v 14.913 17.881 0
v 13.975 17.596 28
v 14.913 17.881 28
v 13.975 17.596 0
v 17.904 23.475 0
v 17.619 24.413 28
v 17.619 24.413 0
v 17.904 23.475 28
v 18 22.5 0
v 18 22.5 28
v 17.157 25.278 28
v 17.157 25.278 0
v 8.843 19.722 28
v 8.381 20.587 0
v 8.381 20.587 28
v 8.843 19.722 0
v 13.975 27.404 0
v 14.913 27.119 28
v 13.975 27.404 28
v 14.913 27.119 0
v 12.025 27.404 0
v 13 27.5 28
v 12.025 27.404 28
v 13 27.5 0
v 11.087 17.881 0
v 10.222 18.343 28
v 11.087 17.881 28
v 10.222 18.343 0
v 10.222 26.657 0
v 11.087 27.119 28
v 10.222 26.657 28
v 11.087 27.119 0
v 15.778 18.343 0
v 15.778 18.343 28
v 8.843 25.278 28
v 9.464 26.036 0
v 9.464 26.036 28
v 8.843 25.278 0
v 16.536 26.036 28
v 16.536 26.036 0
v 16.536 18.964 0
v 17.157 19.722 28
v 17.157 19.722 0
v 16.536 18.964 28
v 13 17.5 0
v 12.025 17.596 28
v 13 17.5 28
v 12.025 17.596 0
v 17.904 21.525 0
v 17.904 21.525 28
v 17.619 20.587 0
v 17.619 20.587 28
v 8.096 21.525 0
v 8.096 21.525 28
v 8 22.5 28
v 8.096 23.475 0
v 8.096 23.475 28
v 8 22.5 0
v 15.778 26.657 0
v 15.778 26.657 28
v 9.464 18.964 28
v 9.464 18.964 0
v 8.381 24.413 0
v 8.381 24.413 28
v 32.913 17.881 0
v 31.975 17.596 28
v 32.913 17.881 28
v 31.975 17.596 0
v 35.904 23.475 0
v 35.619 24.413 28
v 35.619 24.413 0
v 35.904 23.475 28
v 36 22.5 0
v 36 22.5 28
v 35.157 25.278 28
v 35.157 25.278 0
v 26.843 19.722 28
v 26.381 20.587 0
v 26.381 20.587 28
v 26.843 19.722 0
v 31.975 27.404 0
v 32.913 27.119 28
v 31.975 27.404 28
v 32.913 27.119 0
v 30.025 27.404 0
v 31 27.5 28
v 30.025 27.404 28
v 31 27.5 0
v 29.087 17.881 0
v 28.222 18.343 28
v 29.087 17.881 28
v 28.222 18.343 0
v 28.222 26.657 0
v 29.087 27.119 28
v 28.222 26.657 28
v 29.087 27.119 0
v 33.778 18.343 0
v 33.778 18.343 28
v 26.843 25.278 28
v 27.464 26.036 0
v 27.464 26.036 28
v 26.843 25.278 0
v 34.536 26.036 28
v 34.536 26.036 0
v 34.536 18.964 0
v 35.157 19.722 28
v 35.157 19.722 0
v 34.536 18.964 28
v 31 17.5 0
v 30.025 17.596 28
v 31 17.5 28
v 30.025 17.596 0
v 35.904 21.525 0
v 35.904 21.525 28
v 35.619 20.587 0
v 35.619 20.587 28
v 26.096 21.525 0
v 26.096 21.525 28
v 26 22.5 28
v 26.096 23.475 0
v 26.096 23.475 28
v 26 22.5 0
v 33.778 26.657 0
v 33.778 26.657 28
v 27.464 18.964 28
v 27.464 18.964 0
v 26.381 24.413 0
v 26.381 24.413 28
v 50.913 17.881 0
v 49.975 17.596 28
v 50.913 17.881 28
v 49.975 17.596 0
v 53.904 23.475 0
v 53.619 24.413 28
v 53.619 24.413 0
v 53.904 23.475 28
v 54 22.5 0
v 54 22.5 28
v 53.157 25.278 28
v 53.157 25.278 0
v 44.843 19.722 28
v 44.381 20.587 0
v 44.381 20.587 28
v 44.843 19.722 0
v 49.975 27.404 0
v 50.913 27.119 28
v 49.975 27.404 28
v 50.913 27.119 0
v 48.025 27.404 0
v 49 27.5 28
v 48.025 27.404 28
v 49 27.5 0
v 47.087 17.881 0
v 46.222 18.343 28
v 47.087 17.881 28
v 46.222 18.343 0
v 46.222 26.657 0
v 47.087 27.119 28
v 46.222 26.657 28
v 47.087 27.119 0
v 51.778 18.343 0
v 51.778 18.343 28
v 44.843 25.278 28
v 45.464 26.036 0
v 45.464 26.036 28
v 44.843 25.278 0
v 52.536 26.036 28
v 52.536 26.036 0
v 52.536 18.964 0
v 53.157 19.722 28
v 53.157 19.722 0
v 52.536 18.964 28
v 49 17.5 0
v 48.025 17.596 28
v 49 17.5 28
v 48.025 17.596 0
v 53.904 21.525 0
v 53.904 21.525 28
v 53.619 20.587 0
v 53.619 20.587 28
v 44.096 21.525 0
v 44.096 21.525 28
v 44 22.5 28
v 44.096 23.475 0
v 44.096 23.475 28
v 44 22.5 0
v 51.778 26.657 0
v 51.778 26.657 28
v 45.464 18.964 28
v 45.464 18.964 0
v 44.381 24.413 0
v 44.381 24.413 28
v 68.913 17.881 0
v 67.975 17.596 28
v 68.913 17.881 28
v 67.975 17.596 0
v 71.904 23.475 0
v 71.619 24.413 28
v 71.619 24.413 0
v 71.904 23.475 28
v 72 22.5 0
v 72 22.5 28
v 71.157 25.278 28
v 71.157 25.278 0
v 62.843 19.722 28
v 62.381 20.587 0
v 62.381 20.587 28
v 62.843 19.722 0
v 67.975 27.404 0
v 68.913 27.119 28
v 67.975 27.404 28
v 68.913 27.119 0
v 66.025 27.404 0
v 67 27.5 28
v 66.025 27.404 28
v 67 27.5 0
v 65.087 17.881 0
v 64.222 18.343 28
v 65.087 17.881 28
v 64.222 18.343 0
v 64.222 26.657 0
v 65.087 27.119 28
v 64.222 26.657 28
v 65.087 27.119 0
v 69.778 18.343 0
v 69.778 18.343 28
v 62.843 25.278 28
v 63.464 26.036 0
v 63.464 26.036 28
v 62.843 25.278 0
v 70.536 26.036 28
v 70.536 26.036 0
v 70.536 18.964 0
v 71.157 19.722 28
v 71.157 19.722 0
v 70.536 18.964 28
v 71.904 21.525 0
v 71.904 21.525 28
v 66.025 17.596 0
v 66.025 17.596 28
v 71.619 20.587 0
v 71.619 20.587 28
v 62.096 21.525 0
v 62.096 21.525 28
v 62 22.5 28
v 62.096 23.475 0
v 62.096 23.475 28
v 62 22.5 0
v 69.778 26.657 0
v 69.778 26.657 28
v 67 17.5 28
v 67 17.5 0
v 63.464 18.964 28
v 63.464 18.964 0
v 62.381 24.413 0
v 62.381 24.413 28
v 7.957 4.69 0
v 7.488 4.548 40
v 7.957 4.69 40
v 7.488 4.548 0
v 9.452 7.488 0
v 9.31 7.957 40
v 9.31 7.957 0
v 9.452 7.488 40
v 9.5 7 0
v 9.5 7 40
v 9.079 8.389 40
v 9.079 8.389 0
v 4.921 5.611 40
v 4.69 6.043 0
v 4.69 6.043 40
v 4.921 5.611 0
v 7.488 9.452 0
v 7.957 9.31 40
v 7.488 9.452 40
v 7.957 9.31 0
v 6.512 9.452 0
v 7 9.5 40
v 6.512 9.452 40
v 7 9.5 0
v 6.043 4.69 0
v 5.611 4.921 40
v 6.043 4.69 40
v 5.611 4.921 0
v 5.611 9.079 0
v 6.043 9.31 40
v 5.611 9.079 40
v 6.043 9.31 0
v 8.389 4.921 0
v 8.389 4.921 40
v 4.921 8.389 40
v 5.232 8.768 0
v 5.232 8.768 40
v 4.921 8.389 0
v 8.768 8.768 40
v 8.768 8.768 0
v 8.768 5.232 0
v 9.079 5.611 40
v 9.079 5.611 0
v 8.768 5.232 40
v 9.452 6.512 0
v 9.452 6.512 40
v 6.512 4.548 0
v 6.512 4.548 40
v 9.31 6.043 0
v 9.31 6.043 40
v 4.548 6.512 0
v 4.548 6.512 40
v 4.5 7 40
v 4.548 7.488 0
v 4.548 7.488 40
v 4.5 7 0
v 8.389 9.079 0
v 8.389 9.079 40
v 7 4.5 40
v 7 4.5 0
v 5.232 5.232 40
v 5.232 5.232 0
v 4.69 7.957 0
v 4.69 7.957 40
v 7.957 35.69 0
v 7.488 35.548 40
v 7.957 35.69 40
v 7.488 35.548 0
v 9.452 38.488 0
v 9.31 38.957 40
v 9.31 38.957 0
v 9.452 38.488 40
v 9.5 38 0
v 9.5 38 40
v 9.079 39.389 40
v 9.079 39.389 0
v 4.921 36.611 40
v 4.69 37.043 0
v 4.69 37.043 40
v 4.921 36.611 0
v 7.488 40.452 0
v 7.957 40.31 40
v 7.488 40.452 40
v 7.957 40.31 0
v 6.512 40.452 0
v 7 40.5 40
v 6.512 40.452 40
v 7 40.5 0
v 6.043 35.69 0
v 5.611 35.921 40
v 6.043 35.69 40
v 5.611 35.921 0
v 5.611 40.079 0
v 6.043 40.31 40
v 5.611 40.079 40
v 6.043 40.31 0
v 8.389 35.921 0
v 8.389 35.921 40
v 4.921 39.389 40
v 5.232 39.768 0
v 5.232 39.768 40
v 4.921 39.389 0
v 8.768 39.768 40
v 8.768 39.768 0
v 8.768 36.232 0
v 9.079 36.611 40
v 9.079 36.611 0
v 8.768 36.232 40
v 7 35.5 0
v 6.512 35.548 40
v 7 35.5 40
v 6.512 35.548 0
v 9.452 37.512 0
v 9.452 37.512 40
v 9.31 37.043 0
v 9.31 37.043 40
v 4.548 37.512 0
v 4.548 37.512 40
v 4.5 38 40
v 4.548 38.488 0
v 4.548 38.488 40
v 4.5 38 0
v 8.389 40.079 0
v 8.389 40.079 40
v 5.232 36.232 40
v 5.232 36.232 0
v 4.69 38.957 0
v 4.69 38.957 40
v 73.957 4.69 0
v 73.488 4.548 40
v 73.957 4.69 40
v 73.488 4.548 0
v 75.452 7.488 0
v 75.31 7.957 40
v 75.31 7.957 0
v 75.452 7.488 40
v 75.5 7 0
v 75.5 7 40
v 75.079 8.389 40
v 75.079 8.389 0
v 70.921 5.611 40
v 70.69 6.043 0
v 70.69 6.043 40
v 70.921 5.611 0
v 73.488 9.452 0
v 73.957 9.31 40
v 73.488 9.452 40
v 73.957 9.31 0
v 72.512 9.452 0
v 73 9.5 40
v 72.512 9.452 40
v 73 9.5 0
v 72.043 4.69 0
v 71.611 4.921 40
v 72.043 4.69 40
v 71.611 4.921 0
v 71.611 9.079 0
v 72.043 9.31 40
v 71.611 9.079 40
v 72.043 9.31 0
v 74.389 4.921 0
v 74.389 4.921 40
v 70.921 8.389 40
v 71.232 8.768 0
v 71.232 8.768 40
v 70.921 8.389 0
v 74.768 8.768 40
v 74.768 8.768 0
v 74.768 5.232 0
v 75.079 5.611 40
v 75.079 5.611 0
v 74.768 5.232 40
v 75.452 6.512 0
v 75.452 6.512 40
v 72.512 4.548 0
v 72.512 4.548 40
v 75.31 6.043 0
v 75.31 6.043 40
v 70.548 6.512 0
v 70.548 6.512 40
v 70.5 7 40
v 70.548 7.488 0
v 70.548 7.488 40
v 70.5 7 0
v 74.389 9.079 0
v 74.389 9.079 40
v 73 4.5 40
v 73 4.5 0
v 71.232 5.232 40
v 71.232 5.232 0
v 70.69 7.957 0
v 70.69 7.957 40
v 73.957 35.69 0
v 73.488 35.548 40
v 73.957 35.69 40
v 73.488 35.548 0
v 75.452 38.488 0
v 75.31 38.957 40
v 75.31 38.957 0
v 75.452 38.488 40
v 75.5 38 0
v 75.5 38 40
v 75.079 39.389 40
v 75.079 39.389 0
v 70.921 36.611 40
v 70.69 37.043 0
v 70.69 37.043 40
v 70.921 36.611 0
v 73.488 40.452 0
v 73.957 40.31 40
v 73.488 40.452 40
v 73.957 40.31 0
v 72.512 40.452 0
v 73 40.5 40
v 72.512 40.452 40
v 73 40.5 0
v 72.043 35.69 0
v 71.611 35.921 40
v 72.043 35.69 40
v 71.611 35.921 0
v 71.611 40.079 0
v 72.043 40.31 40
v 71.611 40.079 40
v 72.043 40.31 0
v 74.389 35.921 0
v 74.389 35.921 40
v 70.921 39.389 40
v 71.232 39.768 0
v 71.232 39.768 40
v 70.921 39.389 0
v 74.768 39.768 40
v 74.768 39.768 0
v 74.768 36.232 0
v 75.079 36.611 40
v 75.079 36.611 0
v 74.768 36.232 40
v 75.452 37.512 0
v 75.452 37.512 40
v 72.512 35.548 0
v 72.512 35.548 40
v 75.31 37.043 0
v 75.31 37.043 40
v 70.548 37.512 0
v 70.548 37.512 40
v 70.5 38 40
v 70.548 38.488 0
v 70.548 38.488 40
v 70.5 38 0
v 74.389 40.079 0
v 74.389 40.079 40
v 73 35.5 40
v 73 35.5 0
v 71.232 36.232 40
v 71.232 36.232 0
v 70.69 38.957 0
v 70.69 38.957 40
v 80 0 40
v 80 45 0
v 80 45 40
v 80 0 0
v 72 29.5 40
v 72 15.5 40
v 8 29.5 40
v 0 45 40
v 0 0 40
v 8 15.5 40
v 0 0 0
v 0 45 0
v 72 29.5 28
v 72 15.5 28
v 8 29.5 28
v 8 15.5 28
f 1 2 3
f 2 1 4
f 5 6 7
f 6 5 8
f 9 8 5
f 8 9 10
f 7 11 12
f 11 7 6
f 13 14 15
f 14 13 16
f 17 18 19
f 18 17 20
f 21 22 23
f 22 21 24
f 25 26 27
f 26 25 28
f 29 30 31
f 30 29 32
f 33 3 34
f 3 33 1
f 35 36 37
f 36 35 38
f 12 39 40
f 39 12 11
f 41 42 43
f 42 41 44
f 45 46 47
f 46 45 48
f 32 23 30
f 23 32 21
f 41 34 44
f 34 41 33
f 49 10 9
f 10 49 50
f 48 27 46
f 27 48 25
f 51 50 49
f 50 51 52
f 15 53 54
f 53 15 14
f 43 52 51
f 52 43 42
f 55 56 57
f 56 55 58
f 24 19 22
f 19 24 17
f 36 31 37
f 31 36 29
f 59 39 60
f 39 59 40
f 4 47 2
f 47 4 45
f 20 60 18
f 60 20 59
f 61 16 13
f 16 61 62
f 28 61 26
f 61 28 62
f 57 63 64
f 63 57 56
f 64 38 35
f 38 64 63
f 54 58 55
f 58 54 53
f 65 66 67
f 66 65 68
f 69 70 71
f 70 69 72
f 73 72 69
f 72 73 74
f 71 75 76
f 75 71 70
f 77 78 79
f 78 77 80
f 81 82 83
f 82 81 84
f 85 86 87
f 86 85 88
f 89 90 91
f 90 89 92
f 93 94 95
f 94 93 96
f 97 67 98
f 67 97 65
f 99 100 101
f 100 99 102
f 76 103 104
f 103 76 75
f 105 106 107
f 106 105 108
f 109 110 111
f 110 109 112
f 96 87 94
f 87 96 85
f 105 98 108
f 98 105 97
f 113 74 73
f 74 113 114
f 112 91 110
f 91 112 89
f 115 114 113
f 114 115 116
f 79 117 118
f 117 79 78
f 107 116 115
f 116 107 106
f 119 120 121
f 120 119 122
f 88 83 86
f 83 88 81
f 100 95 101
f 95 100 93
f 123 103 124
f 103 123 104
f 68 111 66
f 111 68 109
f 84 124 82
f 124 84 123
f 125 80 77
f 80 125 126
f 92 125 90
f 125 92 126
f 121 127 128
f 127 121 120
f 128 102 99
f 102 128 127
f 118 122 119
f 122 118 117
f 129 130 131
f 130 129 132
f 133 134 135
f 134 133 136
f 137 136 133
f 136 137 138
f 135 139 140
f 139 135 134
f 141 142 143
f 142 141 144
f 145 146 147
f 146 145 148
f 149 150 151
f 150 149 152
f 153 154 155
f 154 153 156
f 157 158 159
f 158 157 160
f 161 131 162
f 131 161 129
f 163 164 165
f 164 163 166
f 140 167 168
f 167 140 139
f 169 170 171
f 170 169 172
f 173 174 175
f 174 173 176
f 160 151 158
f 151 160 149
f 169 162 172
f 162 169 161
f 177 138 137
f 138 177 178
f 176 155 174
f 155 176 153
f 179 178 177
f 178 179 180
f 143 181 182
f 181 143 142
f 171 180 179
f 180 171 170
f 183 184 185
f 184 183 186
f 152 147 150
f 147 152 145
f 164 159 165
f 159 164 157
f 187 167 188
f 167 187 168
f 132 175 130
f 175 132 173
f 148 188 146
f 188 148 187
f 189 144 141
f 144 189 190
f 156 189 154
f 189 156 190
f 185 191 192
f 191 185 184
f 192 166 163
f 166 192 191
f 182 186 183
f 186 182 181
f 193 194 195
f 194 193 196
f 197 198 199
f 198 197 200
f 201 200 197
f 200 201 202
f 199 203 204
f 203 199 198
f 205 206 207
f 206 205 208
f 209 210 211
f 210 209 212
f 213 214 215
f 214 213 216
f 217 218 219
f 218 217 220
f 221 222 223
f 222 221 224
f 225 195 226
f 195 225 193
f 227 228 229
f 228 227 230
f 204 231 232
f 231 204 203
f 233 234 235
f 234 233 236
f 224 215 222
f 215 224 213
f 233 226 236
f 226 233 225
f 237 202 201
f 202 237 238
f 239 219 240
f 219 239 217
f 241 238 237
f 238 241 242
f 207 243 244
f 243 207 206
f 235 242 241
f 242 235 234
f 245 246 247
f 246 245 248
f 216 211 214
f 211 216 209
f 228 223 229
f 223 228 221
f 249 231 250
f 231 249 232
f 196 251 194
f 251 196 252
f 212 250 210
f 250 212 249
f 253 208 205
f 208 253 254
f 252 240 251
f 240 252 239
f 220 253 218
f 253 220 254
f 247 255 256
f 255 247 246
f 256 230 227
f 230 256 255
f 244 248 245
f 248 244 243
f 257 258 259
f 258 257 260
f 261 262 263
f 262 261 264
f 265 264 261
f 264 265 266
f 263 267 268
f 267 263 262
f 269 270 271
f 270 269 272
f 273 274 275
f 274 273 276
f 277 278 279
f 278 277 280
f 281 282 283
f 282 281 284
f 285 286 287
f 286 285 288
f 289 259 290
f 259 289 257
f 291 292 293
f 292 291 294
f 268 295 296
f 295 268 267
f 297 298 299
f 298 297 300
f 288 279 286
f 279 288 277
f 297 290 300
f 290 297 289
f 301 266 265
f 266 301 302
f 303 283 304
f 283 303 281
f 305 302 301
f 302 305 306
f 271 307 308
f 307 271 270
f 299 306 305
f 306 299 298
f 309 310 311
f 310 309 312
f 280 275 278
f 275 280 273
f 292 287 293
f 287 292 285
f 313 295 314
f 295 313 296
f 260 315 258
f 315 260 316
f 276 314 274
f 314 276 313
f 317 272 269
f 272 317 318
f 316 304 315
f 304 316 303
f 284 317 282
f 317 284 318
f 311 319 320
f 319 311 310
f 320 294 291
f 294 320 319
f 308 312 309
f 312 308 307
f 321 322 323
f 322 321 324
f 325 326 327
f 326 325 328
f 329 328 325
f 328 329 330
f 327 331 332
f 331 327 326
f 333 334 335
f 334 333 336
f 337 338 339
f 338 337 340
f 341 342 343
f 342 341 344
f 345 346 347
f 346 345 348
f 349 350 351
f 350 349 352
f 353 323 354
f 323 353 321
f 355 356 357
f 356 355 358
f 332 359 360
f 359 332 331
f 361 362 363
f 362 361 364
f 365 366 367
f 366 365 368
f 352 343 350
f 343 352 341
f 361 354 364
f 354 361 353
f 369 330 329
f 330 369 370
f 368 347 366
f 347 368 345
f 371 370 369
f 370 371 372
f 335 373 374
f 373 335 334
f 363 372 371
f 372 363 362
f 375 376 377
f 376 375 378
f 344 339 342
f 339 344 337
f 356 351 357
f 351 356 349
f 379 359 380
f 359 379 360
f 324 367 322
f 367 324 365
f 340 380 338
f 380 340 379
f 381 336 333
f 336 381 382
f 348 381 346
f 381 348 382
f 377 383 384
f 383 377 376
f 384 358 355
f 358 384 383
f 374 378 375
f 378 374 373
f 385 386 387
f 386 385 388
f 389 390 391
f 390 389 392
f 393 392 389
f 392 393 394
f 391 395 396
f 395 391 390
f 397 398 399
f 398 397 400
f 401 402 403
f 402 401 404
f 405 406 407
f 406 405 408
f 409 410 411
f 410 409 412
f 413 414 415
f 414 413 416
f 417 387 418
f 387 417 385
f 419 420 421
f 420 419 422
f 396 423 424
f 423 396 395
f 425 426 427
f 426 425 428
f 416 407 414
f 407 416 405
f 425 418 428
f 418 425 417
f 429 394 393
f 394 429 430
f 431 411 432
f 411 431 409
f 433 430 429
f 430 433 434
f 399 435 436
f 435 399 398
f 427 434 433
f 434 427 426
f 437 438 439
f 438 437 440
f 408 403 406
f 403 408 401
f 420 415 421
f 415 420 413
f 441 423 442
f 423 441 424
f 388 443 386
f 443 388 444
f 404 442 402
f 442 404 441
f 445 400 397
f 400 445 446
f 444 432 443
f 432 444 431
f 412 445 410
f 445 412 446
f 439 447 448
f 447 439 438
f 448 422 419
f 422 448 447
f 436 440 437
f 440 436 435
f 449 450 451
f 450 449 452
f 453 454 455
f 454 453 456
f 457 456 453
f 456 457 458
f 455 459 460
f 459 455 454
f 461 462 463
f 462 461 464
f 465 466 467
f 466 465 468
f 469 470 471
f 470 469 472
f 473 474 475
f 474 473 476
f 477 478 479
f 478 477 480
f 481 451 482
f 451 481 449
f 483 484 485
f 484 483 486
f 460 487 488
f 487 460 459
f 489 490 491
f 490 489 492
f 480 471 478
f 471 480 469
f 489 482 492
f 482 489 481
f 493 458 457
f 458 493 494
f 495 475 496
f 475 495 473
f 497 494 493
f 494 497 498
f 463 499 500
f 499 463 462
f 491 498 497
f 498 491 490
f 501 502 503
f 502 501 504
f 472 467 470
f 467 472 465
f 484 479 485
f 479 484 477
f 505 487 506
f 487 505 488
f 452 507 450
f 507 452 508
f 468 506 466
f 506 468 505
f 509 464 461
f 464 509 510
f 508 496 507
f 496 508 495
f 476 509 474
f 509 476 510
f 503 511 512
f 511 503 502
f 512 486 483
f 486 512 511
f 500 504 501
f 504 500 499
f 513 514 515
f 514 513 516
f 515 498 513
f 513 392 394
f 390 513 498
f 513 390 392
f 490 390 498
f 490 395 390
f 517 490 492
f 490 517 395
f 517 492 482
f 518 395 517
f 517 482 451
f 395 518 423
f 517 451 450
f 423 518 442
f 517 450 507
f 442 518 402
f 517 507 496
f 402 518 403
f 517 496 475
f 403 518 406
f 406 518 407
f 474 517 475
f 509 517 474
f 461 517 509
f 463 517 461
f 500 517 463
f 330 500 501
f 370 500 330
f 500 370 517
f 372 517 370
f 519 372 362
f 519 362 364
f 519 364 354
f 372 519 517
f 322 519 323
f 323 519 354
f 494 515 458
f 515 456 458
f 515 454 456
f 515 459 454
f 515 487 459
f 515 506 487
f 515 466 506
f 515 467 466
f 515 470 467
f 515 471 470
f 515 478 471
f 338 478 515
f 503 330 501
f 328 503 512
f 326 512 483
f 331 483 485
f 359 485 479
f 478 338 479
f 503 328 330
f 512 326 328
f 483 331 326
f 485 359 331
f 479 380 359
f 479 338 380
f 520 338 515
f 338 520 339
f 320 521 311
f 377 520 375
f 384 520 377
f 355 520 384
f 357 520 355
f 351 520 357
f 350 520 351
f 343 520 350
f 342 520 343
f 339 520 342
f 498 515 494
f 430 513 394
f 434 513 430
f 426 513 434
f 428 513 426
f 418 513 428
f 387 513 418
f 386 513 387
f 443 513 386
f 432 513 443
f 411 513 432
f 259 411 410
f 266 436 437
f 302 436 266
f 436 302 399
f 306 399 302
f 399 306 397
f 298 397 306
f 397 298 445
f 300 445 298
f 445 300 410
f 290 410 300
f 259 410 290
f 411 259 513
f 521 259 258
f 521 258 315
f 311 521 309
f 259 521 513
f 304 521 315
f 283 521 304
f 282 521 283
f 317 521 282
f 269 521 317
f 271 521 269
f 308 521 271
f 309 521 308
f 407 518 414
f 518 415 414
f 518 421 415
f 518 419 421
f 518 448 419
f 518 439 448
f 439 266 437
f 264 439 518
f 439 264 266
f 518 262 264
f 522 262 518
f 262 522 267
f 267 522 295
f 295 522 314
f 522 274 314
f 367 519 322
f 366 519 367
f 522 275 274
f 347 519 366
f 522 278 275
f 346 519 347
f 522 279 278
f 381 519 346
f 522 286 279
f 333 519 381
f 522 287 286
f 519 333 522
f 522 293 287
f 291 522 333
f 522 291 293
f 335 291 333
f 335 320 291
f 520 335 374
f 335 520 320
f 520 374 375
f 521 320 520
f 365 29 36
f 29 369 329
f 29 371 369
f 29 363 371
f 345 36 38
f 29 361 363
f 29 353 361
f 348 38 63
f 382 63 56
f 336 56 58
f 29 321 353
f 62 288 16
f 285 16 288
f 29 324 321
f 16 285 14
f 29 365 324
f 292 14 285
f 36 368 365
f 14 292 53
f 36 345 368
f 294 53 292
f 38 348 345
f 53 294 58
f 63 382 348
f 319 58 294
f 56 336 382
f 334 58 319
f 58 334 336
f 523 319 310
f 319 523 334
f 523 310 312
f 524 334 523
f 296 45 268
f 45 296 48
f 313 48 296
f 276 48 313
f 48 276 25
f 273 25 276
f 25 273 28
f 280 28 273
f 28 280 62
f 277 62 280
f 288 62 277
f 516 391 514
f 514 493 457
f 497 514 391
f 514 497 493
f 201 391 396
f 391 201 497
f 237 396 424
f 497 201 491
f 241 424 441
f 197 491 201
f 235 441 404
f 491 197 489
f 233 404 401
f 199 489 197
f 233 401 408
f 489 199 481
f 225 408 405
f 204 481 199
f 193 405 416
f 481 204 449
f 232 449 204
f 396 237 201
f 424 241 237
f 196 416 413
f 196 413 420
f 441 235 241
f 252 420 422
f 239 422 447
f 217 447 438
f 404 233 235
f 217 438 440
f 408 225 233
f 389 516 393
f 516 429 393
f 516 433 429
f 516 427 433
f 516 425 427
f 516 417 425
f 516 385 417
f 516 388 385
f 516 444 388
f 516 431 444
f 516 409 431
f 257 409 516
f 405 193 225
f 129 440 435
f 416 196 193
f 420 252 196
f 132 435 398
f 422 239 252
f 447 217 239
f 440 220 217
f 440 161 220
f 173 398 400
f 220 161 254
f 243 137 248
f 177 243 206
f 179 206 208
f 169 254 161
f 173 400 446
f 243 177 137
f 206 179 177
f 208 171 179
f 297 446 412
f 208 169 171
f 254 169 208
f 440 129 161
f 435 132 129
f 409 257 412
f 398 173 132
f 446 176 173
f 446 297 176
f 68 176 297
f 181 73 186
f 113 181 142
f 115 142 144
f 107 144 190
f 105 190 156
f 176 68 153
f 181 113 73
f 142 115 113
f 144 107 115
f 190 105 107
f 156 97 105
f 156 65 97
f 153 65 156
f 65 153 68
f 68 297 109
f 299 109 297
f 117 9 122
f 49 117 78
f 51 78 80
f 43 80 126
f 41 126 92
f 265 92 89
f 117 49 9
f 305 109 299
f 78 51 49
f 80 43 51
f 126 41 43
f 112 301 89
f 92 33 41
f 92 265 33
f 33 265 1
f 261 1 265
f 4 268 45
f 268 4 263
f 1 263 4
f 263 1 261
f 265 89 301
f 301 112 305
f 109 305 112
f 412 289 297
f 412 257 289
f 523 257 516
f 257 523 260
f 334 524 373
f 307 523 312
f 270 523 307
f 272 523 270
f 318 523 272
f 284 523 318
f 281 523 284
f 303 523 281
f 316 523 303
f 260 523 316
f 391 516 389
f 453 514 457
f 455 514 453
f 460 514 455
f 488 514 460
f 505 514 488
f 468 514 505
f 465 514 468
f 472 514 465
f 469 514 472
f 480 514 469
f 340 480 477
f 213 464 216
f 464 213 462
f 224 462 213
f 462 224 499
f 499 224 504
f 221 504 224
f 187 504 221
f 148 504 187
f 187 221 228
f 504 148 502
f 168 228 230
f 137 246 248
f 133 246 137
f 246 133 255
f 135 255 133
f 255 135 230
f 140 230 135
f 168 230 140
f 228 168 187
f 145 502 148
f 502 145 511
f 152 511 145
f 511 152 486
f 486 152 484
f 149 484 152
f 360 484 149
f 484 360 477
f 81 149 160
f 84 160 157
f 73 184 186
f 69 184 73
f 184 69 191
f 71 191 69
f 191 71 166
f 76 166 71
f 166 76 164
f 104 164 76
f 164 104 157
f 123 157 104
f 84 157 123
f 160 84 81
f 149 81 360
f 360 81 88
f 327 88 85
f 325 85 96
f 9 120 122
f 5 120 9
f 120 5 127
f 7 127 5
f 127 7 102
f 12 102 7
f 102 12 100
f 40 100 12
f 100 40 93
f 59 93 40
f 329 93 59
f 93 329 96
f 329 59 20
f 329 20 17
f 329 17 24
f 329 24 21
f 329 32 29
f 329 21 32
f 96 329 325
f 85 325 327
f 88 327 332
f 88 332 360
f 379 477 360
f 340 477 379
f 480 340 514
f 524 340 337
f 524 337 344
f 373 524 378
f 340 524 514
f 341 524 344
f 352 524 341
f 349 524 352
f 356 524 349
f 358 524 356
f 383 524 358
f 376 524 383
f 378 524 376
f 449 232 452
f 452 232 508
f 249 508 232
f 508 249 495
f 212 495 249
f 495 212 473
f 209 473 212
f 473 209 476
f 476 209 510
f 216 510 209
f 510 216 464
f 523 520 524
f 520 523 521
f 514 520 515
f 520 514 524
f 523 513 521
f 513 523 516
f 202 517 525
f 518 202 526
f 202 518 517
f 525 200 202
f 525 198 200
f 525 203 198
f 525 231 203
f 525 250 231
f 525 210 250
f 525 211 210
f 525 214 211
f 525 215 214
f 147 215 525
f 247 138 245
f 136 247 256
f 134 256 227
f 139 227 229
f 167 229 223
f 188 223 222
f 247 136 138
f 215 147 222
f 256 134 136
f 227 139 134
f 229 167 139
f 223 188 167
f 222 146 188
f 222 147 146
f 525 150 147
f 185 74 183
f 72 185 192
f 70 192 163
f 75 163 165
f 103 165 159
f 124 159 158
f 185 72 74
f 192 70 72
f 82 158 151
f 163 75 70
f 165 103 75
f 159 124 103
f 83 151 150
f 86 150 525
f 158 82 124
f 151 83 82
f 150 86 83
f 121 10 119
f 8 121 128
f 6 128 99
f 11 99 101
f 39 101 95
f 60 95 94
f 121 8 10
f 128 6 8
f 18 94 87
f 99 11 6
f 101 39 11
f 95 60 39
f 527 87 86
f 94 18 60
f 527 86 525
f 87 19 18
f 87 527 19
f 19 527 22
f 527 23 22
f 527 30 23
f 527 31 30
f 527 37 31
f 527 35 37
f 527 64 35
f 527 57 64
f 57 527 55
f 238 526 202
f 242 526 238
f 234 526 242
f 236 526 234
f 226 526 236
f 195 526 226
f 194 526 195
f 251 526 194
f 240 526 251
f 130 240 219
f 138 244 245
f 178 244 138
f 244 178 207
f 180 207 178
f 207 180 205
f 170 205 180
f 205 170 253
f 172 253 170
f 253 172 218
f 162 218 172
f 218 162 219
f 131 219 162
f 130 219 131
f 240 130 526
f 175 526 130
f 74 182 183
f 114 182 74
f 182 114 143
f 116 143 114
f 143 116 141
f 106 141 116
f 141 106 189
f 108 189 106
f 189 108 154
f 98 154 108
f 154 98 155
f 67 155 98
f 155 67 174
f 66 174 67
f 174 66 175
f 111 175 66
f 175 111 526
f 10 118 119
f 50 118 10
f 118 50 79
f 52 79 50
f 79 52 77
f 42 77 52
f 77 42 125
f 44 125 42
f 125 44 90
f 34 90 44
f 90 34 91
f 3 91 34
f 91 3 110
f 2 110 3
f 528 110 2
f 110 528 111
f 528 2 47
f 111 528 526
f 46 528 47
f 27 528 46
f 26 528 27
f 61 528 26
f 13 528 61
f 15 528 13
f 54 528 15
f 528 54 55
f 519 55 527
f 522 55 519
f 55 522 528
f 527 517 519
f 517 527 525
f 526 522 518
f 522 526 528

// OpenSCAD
$fn = 32;

// ----------------------------------------------------------------------
// Manifold block: gallery_top manifold
// ----------------------------------------------------------------------

// --- parameters (mm) ---
block_l = 80;             // block length, X
block_w = 45;             // block width, Y
block_h = 40;             // block height, Z
port_d = 10;              // port bore diameter
port_pitch = 18;          // port pitch along X
gallery_d = 14;           // top gallery width, Y
gallery_depth = 12;       // gallery pocket depth
wall_p = 8;               // gallery end wall thickness, X
mnt_d = 5;                // mounting hole diameter
mnt_in = 7;               // mounting hole inset from the edges

n_ports = 4;  // ports in the row
port_x0 = (block_l - (n_ports - 1) * port_pitch) / 2;  // first port X

difference() {
  cube([block_l, block_w, block_h]);
  for (i = [0 : n_ports - 1])
    translate([port_x0 + i * port_pitch, block_w / 2, -1])
      cylinder(h = block_h + 2, d = port_d);
  translate([wall_p, block_w / 2 - gallery_d / 2, block_h - gallery_depth])
    cube([block_l - 2 * wall_p, gallery_d, gallery_depth + 1]);
  for (cx = [mnt_in, block_l - mnt_in])
    for (cy = [mnt_in, block_w - mnt_in])
      translate([cx, cy, -1]) cylinder(h = block_h + 2, d = mnt_d);
}
